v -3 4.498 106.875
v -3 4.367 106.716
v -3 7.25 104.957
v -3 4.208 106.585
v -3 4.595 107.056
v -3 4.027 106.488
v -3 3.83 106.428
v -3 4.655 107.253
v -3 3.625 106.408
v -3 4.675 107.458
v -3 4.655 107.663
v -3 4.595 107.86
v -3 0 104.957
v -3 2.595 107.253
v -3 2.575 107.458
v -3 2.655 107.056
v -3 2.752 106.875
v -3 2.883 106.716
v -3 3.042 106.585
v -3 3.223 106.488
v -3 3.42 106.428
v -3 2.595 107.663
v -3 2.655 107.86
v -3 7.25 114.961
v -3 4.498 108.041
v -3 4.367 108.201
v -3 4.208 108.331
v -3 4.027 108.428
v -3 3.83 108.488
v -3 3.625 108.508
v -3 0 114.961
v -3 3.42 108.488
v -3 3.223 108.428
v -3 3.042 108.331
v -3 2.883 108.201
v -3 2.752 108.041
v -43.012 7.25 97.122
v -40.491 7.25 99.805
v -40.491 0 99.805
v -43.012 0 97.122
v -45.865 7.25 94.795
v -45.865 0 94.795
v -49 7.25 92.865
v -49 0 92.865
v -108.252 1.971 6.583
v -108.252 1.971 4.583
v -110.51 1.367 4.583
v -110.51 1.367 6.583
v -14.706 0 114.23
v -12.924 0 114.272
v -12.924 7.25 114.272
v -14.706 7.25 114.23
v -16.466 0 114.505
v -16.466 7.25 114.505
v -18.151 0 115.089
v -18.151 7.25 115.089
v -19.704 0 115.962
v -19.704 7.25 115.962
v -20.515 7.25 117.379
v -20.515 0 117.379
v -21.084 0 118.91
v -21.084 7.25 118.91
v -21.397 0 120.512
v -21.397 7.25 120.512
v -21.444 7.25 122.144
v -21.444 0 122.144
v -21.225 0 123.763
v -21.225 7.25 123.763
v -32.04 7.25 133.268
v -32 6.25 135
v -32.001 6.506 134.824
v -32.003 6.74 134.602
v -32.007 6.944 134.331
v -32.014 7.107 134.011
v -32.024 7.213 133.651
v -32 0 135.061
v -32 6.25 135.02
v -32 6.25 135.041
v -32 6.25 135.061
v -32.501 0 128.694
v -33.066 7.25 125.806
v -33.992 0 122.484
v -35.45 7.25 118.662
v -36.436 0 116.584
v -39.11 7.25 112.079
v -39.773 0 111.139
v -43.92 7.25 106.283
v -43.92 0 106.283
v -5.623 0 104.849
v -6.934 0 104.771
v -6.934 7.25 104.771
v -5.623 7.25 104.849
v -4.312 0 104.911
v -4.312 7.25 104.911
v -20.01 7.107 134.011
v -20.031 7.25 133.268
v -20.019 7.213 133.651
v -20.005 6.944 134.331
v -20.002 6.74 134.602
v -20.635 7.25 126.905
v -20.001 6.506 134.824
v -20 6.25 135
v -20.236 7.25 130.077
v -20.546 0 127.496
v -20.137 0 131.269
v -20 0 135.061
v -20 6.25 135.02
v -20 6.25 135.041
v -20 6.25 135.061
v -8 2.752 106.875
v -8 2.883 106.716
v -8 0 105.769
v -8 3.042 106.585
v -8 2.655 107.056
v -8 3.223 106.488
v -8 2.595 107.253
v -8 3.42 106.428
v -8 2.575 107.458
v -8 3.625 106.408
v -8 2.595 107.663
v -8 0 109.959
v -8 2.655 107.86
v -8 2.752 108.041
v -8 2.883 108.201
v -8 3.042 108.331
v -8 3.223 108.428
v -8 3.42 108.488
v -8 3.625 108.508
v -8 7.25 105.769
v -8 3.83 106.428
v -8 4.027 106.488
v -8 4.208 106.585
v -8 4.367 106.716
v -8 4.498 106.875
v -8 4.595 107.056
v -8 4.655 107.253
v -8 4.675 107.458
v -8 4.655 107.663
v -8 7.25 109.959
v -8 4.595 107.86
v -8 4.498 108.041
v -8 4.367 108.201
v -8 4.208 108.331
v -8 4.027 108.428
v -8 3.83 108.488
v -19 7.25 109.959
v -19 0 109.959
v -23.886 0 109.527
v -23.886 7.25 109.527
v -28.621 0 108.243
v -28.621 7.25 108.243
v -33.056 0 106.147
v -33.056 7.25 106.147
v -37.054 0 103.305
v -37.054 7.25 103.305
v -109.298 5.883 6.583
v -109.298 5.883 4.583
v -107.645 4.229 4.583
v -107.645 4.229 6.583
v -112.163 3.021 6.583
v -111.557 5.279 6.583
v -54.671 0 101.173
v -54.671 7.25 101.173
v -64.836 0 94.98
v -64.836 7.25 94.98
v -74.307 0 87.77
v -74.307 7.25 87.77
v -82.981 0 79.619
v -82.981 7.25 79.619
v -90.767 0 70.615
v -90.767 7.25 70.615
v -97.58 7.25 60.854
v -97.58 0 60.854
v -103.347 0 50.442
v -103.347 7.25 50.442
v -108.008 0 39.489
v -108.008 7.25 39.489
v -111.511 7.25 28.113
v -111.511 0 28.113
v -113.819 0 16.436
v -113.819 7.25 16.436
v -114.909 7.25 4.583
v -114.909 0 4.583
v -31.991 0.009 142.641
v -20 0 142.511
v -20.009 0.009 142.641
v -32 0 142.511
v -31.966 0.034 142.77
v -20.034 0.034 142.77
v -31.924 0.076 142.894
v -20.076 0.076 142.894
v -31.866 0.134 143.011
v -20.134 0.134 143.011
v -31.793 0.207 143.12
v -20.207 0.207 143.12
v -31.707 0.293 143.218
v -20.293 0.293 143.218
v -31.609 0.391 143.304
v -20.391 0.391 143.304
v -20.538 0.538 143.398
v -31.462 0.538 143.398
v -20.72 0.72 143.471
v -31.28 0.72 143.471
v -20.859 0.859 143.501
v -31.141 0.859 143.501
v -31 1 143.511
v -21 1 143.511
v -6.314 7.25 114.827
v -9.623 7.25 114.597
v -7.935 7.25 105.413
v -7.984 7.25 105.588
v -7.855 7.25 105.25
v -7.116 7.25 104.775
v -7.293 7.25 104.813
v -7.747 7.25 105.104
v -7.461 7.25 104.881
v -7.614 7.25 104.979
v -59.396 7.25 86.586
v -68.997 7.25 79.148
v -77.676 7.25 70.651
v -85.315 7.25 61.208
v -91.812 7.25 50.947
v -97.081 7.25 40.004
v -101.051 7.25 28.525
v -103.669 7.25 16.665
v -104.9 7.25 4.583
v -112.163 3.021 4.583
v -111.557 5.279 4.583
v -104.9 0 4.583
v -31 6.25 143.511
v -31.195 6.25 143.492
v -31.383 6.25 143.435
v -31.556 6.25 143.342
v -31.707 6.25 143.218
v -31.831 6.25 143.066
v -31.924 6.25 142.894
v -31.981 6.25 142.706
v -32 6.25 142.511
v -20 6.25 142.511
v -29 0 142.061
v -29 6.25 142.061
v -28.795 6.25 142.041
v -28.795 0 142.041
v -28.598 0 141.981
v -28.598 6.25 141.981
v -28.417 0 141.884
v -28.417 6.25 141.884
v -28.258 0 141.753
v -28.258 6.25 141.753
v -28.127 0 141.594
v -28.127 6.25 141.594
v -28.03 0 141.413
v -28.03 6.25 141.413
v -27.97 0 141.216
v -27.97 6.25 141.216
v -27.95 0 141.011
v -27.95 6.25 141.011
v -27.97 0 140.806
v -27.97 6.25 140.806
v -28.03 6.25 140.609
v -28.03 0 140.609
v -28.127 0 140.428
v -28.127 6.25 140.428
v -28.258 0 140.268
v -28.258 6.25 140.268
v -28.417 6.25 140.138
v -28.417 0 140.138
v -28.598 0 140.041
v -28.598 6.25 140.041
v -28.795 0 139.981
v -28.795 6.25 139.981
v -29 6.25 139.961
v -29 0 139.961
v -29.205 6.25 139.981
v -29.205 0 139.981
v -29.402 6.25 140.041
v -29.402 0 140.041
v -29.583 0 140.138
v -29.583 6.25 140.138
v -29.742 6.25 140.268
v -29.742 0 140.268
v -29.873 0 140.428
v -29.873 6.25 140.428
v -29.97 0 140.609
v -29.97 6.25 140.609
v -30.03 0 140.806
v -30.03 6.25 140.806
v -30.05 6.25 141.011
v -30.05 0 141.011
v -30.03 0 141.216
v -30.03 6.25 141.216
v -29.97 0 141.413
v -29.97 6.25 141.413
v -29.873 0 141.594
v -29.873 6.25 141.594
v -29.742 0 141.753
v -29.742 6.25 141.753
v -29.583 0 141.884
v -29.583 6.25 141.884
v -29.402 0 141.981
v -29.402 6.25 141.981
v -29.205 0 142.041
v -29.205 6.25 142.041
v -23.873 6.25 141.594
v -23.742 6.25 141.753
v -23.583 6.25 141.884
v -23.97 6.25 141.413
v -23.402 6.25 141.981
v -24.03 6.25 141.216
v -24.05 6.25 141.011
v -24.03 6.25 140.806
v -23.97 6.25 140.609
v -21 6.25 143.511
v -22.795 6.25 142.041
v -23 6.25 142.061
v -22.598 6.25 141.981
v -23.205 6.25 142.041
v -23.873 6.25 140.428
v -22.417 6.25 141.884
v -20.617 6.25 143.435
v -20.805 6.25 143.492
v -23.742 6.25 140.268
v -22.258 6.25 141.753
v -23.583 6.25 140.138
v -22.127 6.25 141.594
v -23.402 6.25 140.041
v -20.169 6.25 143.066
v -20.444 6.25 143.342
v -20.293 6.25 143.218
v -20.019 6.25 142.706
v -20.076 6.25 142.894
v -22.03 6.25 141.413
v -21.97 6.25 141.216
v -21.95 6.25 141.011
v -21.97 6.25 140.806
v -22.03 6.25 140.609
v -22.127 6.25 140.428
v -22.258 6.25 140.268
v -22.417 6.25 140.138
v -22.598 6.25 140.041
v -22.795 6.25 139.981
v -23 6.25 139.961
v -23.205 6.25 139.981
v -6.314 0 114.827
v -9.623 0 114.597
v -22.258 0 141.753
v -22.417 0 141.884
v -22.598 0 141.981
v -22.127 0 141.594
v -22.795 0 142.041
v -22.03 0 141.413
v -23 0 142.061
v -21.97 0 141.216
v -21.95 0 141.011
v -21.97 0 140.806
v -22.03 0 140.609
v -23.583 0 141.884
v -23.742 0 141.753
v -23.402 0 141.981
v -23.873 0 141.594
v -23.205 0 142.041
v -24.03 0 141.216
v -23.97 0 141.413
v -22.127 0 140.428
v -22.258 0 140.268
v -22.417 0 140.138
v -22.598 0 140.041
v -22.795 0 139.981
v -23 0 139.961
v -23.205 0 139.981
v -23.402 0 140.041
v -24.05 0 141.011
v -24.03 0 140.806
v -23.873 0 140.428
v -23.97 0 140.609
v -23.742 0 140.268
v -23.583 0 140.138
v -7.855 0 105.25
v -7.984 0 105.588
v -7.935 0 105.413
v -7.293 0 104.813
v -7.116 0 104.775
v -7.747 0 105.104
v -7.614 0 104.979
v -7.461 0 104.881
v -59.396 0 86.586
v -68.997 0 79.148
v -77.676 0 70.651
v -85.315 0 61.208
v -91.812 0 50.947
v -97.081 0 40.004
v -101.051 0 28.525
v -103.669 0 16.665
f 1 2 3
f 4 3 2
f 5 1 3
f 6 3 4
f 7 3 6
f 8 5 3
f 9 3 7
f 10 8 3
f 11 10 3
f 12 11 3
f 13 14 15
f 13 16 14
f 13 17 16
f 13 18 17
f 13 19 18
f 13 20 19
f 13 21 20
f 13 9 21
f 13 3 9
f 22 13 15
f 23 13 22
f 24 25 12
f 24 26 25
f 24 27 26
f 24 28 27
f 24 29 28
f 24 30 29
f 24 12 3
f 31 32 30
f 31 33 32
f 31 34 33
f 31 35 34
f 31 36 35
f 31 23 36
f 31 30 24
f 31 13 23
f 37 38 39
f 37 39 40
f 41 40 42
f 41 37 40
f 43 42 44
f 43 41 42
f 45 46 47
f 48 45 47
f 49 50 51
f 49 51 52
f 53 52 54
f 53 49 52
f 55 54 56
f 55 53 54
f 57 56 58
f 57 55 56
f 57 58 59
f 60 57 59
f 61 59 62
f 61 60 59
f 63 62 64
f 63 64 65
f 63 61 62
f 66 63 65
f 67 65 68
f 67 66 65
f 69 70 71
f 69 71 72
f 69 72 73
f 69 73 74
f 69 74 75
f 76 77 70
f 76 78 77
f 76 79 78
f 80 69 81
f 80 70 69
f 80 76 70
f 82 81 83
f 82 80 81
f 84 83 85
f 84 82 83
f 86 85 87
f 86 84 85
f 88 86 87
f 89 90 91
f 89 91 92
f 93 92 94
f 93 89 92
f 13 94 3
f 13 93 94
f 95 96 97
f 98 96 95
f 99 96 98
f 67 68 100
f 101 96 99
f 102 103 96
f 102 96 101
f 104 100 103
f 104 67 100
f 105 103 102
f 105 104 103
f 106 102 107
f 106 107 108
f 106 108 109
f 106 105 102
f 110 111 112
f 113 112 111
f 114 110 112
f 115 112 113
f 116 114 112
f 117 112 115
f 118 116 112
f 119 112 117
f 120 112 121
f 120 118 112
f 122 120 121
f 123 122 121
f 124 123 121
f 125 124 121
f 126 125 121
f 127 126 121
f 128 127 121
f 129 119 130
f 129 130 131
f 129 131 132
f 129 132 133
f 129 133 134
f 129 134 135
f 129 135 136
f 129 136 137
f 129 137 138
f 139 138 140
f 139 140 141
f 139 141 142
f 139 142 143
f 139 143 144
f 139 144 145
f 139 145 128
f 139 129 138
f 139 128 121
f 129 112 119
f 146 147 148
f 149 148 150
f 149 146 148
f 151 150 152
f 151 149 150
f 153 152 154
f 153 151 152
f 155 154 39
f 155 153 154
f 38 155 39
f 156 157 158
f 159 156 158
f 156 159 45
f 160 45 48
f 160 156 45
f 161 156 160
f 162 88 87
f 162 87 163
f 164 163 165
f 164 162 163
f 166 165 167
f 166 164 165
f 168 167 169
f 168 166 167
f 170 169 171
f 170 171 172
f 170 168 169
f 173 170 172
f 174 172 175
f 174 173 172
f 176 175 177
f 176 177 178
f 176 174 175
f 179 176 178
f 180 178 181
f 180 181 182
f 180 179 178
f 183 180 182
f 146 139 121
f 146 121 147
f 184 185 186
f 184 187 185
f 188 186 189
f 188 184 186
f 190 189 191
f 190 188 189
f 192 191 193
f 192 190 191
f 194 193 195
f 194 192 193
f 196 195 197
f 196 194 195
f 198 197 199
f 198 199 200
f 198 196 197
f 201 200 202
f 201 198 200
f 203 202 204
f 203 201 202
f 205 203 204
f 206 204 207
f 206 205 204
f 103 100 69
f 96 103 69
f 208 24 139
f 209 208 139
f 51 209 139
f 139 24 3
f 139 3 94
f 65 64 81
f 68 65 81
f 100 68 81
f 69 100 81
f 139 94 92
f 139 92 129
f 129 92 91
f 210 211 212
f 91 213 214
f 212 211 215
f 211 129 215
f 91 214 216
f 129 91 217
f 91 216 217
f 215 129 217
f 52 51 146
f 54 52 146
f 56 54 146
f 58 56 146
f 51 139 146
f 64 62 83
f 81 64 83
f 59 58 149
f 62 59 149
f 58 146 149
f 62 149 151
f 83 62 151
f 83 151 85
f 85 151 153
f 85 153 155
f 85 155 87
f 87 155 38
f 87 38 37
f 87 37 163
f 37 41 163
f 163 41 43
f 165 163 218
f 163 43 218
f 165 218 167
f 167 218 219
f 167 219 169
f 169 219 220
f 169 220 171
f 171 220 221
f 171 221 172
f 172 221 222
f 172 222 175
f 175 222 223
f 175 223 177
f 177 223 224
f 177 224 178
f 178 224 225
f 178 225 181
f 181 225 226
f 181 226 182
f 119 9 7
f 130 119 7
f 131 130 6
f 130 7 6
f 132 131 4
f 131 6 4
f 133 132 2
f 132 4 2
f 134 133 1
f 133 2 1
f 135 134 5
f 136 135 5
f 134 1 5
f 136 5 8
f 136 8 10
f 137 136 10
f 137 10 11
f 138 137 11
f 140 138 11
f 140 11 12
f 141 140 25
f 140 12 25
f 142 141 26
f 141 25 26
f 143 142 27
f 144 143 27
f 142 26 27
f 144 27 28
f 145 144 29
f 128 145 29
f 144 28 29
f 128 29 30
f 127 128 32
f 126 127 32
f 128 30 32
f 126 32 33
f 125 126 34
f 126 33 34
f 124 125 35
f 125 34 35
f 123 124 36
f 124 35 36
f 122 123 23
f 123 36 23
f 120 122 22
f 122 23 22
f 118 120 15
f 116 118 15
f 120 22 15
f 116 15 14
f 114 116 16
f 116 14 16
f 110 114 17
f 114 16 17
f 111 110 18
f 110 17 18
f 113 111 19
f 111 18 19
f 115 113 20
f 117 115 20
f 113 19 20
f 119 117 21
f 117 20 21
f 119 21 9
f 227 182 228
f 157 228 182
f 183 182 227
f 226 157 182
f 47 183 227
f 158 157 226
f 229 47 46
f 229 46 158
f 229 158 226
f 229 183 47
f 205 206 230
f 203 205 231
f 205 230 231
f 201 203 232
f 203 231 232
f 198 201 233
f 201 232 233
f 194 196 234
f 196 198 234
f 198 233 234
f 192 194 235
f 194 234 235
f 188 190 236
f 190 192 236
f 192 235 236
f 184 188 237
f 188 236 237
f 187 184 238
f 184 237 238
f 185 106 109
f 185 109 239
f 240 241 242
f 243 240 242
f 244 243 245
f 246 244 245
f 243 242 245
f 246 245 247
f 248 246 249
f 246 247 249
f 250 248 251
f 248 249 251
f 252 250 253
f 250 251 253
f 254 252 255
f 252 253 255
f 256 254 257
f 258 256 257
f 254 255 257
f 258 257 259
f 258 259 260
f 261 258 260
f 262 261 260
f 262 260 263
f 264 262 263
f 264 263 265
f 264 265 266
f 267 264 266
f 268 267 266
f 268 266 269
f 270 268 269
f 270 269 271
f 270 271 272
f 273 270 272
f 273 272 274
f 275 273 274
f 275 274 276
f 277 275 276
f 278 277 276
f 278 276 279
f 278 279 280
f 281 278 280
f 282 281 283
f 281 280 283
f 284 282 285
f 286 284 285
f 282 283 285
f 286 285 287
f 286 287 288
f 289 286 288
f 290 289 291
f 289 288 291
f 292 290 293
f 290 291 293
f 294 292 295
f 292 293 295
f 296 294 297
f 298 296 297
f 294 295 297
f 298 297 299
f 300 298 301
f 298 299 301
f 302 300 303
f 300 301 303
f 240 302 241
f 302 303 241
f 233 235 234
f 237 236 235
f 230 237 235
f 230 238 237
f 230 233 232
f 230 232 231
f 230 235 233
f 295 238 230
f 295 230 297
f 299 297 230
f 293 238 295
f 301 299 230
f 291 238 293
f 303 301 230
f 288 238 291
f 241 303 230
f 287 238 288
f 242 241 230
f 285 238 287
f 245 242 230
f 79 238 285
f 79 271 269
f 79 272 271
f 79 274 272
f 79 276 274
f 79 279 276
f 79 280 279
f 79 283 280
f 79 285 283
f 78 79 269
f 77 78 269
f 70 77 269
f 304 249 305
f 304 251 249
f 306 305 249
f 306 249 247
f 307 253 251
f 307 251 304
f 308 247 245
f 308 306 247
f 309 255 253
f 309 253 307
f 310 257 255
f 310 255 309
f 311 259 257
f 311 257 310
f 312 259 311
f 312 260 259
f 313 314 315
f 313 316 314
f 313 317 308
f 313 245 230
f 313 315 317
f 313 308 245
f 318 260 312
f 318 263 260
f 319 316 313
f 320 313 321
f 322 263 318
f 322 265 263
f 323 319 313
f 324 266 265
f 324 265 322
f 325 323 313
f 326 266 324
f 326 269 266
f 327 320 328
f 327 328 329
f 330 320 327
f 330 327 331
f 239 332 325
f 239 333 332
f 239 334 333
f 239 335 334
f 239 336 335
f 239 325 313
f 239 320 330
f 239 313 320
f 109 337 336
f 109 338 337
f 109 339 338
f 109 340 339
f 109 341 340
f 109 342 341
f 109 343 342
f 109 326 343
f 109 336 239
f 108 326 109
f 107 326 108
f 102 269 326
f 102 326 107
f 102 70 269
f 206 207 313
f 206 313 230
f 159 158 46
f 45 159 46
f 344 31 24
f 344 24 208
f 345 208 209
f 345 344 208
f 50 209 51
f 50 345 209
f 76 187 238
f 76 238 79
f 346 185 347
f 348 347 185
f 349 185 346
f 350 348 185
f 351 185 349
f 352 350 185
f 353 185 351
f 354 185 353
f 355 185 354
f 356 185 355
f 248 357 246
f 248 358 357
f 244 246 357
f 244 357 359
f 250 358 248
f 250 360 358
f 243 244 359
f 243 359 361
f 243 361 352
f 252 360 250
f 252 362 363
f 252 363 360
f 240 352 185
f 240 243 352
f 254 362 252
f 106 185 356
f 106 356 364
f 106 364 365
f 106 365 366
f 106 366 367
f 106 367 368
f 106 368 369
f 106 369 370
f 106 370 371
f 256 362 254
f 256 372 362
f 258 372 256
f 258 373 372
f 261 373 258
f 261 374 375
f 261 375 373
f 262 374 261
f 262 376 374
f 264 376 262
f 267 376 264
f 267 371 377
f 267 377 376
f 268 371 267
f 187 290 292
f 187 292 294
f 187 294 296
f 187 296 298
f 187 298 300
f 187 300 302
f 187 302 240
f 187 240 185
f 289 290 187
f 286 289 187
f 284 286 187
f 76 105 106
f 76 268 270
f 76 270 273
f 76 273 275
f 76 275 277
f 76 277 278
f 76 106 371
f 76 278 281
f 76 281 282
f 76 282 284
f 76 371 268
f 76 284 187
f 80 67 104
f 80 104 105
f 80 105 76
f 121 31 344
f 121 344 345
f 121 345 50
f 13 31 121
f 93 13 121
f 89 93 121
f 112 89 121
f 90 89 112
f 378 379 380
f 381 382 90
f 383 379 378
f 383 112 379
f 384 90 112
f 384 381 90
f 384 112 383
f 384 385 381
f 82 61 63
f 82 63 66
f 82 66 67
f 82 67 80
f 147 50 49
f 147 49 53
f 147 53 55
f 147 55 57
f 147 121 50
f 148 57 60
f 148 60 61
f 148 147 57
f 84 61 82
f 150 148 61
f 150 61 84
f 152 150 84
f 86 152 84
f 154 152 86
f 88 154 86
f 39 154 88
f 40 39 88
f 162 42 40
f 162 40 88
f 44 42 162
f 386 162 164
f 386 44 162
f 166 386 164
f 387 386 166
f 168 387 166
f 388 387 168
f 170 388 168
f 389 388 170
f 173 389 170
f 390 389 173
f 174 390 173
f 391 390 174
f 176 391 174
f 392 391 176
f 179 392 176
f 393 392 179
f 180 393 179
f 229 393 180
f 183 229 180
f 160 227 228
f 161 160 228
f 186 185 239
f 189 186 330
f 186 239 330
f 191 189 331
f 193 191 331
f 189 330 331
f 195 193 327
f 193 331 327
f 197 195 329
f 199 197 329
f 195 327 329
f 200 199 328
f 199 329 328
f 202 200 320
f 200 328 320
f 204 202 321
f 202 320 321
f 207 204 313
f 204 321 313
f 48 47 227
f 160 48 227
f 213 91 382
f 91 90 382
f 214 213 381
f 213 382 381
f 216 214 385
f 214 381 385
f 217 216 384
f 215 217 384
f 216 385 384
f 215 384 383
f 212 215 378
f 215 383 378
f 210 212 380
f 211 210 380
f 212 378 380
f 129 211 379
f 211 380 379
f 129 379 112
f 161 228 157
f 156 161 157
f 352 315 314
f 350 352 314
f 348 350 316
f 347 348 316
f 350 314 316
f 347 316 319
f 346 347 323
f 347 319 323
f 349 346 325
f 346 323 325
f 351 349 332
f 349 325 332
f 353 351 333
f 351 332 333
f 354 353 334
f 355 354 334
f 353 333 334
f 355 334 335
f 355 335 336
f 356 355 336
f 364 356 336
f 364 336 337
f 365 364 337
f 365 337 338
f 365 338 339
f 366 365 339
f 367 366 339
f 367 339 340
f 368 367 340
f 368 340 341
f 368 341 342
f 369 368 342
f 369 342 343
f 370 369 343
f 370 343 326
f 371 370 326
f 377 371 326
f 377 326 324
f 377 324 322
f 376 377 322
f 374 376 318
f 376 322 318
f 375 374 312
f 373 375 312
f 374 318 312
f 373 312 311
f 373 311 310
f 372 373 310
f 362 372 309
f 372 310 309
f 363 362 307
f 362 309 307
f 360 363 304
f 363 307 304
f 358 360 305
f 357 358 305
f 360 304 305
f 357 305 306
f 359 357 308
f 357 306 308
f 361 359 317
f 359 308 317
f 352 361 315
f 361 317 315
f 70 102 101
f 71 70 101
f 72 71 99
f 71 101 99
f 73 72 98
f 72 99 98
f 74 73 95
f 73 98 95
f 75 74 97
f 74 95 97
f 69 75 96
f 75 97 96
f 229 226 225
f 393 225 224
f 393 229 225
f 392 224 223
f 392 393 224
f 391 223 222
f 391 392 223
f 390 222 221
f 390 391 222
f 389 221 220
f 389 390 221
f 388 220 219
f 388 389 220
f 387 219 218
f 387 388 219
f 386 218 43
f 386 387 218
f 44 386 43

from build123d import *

# Parameters (mm, degrees)
BOSS_EXTRUDE1_DEPTH = 7.25
CUT_EXTRUDE2_DEPTH  = 2
SKETCH6_R           = 1.05
CUT_EXTRUDE3_DEPTH  = 184.988971882
FILLET1_R           = 1
CUT_EXTRUDE6_DEPTH  = 10
SKETCH14_R          = 1.05
CUT_EXTRUDE7_DEPTH  = 5
FILLET3_R           = 1
FILLET4_R           = 10
SKETCH16_W          = 40
SKETCH16_H          = 15
CUT_EXTRUDE8_DEPTH  = 1
FILLET5_R           = 2


with BuildPart() as part:
    # Sketch2 → Boss-Extrude1 (new body)
    with BuildSketch(Plane(origin=(0, 0, 0), x_dir=(1, 0, 0), z_dir=(0, 1, 0))):
        with BuildLine():
            Line((-17.623152329, -113.641649504), (-22.623152329, -118.641649504))
            ThreePointArc((-22.623152329, -118.641649504), (-20.659920019, -126.747167143), (-20, -135.060902938))
            Line((-20, -135.060902938), (-20, -143.510902938))
            Line((-20, -143.510902938), (-32, -143.510902938))
            Line((-32, -143.510902938), (-32, -135.060902938))
            ThreePointArc((-32, -135.060902938), (-35.097995018, -119.486230235), (-43.920338415, -106.282660267))
            ThreePointArc((-43.920338415, -106.282660267), (-94.299467161, -65.822568266), (-114.908659431, -4.582574373))
            Line((-114.908659431, -4.582574373), (-104.899952393, -4.582574373))
            ThreePointArc((-104.899952393, -4.582574373), (-73.684211281, -74.803990588), (-3, -104.957134107))
            Line((-3, -104.957134107), (-3, -114.960862906))
            ThreePointArc((-3, -114.960862906), (-10.332651354, -114.534869433), (-17.623152329, -113.641649504))
        make_face()
    extrude(amount=BOSS_EXTRUDE1_DEPTH)

    # Sketch4 → Cut-Extrude2 (cut)
    with BuildSketch(Plane(origin=(0, 0, 4.582574373), x_dir=(-1, 0, 0), z_dir=(0, 0, -1))):
        Polygon((111.556991832, 5.27912492), (109.29813467, 5.883330451), (107.64544875, 4.229205531), (108.251619992, 1.97087508), (110.510477153, 1.366669549), (112.163163073, 3.020794469), align=None)
    extrude(amount=-CUT_EXTRUDE2_DEPTH, mode=Mode.SUBTRACT)

    # Sketch6 → Cut-Extrude3 (cut, through all)
    with BuildSketch(Plane(origin=(0, 7.25, 0), x_dir=(1, 0, 0), z_dir=(0, 1, 0))):
        with Locations(Location((-29, -141.010902938, 0), (0, 0, 270))):
            Circle(SKETCH6_R)
        with Locations(Location((-23, -141.010902938, 0), (0, 0, 270))):
            Circle(SKETCH6_R)
    extrude(amount=-CUT_EXTRUDE3_DEPTH, mode=Mode.SUBTRACT)

    # Fillet1
    fillet1_edges = [part.edges().sort_by_distance(p)[0] for p in [
        (-26, 0, 143.510902938),
        (-20, 3.625, 143.510902938),
        (-32, 3.625, 143.510902938),
        (-26, 7.25, 143.510902938),
    ]]
    fillet(fillet1_edges, radius=FILLET1_R)

    # Sketch13 → Cut-Extrude6 (cut)
    with BuildSketch(Plane(origin=(0, 7.25, 0), x_dir=(1, 0, 0), z_dir=(0, 1, 0))):
        with BuildLine():
            Line((-8, -109.958998506), (-19, -109.958998506))
            ThreePointArc((-19, -109.958998506), (-30.884750495, -107.29264995), (-40.491380382, -99.804701556))
            ThreePointArc((-40.491380382, -99.804701556), (-44.399963721, -95.911179829), (-49, -92.86549413))
            Line((-49, -92.86549413), (-8, -92.86549413))
            Line((-8, -92.86549413), (-8, -109.958998506))
        make_face()
    extrude(amount=-CUT_EXTRUDE6_DEPTH, mode=Mode.SUBTRACT)

    # Sketch14 → Cut-Extrude7 (cut)
    with BuildSketch(Plane(origin=(-3, 0, 0), x_dir=(0, 0, -1), z_dir=(1, 0, 0))):
        with Locations((-107.458066307, 3.625)):
            Circle(SKETCH14_R)
    extrude(amount=-CUT_EXTRUDE7_DEPTH, mode=Mode.SUBTRACT)

    # Fillet3
    fillet3_edges = [part.edges().sort_by_distance(p)[0] for p in [
        (-8, 3.625, 104.694794522),
    ]]
    fillet(fillet3_edges, radius=FILLET3_R)

    # Fillet4
    # the kernel refuses this fillet: 10 mm, written as the material it adds along each edge
    with BuildSketch(Plane(origin=(-22.623152329, 0, 118.641649504), x_dir=(0.7071067811865469, 0, -0.7071067811865481), z_dir=(0, 1, 0))) as fillet4_piece_1:
        with BuildLine():
            CenterArc((5.789991957, -10), FILLET4_R, 90, 57.380097375)
            ThreePointArc((-2.632659996, -4.609366079), (-1.258256696, -2.337851865), (0, 0))
            Line((0, 0), (5.789991957, 0))
        make_face()
    extrude(amount=7.25)
    with BuildSketch(Plane(origin=(-17.623152329, 0, 113.641649504), x_dir=(0.9911373960250678, 0, 0.13284073998833376), z_dir=(0, 1, 0))) as fillet4_piece_2:
        with BuildLine():
            CenterArc((4.947598948, -9.997874884), FILLET4_R, 91.18123592, 51.452542901)
            Line((-3.000126671, -3.928801026), (0, 0))
            ThreePointArc((0, 0), (2.370724496, -0.024438834), (4.741448992, 0))
        make_face()
    extrude(amount=7.25)

    # Sketch16 → Cut-Extrude8 (cut)
    with BuildSketch(Plane(origin=(0, 7.25, 0), x_dir=(1, 0, 0), z_dir=(0, 1, 0))):
        with Locations((-25.357096051, -142.5)):
            Rectangle(SKETCH16_W, SKETCH16_H)
    extrude(amount=-CUT_EXTRUDE8_DEPTH, mode=Mode.SUBTRACT)

    # Fillet5
    # the kernel refuses this fillet: 2 mm, written as the material it takes off along each edge
    with BuildSketch(Plane(origin=(-15.669908173, 7.25, 135), x_dir=(0, 0, -1), z_dir=(-1, 0, 0))) as fillet5_piece_1:
        with BuildLine():
            CenterArc((1.732050808, 2), FILLET5_R, 210, 60)
            Line((0, 1), (-0.034641016, 0.98))
            ThreePointArc((-0.034641016, 0.98), (-0.04, 0.5), (-0.04, 0))
            Line((-0.04, 0), (0, -0.04))
            Line((0, -0.04), (1.732050808, -0.04))
            Line((1.732050808, -0.04), (1.732050808, 0))
        make_face()
    extrude(amount=20.660264414, mode=Mode.SUBTRACT)


solid = part.part
